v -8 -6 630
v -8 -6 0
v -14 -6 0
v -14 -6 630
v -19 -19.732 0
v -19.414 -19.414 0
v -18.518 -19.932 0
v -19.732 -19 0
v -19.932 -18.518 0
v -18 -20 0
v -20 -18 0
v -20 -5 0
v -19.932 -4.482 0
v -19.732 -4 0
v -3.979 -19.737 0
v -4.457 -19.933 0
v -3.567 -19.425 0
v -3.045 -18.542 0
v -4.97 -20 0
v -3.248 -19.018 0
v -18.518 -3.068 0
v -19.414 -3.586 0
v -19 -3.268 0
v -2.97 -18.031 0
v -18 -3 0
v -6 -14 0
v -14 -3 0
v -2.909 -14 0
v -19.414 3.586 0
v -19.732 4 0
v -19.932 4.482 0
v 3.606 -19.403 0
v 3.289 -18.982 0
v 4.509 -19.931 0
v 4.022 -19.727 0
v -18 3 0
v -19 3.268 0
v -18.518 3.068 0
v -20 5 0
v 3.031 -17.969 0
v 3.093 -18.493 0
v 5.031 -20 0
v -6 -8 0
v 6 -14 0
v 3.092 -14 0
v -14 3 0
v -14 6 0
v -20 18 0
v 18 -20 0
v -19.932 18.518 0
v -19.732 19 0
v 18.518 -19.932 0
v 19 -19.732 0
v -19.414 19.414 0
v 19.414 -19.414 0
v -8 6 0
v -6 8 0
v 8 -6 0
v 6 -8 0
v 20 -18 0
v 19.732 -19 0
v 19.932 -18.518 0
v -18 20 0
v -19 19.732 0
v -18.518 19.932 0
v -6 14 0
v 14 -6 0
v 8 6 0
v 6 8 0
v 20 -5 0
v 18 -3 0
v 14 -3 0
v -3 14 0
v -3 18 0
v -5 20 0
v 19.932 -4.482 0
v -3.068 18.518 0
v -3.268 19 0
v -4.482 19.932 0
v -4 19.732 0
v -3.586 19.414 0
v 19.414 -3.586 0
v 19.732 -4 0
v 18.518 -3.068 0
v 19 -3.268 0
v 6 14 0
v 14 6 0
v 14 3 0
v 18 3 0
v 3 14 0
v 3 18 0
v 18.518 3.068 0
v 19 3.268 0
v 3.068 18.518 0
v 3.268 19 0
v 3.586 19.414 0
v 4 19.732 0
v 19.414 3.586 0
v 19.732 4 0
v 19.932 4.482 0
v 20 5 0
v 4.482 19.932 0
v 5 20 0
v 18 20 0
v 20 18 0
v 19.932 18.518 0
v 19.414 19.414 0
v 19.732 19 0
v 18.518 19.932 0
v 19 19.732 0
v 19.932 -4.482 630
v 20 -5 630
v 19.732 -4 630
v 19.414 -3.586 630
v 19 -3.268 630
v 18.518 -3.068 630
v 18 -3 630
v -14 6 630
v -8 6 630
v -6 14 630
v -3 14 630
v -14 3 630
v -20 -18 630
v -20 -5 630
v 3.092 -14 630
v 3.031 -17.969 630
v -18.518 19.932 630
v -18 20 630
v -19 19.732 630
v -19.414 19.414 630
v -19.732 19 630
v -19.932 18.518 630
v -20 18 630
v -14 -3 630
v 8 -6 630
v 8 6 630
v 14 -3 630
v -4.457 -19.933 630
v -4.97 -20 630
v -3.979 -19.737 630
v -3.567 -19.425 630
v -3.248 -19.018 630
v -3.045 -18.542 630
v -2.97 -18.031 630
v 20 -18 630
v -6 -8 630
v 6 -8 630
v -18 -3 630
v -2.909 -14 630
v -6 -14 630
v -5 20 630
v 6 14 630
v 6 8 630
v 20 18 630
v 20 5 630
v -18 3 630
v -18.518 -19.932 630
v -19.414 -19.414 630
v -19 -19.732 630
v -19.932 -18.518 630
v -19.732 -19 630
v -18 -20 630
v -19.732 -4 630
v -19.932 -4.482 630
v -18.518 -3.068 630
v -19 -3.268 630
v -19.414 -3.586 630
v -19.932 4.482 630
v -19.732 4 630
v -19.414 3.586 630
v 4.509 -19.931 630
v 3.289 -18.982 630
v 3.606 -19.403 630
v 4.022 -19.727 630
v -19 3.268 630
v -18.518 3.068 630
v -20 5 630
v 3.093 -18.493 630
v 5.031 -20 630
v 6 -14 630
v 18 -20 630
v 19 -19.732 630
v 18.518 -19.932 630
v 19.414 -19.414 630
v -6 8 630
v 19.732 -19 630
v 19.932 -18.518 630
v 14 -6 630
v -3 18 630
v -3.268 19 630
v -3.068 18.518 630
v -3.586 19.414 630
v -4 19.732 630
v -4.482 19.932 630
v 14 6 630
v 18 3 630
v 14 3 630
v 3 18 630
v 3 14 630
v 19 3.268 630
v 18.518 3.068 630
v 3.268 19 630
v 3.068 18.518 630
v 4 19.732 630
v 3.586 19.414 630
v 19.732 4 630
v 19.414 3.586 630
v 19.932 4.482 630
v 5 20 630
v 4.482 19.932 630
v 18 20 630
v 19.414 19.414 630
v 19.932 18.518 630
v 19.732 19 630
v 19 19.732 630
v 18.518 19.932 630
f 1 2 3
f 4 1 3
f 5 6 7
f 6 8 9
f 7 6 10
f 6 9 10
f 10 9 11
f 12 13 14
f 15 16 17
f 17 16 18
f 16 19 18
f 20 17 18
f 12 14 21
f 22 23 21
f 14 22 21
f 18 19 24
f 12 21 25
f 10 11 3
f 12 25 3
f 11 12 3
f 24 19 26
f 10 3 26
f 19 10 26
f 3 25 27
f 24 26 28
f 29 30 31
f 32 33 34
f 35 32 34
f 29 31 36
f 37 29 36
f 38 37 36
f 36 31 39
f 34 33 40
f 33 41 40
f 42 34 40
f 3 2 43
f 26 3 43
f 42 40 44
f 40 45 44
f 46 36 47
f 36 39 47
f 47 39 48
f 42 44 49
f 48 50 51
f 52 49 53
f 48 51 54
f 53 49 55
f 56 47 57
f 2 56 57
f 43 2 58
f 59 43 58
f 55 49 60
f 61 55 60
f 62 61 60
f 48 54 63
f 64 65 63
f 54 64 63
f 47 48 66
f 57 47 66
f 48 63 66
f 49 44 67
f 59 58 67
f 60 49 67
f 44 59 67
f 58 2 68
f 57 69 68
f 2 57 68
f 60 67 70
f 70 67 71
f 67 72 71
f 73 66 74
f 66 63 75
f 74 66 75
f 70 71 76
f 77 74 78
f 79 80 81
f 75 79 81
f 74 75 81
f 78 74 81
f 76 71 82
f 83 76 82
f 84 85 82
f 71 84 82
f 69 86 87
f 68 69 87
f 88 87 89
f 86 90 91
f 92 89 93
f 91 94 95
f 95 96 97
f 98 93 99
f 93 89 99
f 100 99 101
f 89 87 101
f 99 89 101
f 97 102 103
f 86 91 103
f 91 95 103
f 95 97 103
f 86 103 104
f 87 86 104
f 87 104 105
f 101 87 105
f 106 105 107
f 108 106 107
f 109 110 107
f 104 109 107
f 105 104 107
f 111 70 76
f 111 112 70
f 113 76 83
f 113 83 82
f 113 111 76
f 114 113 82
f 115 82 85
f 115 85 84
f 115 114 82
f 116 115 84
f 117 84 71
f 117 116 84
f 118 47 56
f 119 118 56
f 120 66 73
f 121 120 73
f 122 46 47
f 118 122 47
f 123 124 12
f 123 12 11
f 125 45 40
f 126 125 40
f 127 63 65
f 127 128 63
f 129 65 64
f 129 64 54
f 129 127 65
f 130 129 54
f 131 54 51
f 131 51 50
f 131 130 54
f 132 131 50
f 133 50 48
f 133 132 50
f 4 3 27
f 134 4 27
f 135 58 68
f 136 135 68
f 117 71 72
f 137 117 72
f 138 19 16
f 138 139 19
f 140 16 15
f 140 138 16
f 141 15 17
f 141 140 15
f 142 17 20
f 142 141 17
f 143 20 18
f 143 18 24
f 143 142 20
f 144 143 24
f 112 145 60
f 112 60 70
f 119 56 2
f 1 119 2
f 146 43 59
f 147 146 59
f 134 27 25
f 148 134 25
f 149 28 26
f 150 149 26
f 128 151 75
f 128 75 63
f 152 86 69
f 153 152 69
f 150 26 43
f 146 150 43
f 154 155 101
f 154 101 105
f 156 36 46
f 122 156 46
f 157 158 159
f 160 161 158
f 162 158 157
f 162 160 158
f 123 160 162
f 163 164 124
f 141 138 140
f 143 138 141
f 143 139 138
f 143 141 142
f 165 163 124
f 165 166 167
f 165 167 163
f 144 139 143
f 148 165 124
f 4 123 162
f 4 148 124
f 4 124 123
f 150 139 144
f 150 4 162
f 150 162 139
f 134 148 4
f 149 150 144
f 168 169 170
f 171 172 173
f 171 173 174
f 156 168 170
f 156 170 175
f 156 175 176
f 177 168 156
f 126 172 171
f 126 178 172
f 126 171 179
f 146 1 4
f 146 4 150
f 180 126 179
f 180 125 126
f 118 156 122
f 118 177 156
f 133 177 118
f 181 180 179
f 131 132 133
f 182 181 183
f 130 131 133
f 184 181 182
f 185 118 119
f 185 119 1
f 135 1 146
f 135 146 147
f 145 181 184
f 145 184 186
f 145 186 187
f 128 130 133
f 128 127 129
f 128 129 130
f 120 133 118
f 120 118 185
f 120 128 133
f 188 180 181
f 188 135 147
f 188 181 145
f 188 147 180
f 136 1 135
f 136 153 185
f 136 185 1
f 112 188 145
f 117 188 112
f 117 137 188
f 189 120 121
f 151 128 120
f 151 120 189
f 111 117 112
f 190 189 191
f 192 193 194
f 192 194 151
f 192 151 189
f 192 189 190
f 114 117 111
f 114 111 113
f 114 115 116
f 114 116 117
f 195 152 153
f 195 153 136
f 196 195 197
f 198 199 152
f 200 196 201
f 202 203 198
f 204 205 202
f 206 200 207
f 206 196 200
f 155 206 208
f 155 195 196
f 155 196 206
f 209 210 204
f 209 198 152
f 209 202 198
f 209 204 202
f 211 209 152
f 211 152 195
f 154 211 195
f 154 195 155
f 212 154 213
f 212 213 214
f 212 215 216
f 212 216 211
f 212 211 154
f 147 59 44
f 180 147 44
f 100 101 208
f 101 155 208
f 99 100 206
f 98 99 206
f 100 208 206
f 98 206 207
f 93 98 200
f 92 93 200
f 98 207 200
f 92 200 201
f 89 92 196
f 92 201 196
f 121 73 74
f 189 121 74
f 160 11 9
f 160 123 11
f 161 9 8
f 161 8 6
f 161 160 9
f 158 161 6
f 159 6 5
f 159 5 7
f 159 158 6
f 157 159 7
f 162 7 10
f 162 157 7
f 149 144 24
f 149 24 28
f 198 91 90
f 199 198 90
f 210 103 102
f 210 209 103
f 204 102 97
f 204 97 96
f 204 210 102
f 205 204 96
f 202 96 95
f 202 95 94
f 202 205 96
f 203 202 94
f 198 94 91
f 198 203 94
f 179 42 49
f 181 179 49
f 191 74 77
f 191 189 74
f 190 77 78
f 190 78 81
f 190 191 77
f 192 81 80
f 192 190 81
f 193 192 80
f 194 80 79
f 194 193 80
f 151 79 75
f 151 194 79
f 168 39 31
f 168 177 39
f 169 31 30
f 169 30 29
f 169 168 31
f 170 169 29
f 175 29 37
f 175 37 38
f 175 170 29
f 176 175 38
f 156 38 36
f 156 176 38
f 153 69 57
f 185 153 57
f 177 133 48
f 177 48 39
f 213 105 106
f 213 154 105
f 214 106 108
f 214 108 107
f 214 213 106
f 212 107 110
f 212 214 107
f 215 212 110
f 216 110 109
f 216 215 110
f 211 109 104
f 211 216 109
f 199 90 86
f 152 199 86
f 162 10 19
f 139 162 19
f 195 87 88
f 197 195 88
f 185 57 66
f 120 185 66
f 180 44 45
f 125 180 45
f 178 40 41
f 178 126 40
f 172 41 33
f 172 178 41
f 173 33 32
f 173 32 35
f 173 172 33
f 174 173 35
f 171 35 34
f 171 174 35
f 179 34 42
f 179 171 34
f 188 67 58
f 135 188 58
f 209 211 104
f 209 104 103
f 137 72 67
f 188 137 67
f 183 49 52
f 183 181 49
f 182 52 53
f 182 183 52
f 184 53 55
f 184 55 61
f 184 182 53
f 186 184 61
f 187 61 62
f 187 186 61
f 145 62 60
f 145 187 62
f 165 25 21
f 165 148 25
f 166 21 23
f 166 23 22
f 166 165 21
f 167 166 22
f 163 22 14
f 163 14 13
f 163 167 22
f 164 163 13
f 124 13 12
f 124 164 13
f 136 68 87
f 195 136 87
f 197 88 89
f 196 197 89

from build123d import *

# Parameters (mm, degrees)
F1_DEPTH = 630
F2_R     = 2


with BuildPart() as f1:
    # F0 (on Top) → F1 (new body)
    with BuildSketch(Plane.XY):
        Polygon((20, 3), (20, 20), (3, 20), (3, 14), (6, 14), (6, 8), (-6, 8), (-6, 14), (-3, 14), (-3, 20), (-20, 20), (-20, 3), (-14, 3), (-14, 6), (-8, 6), (-8, -6), (-14, -6), (-14, -3), (-20, -3), (-20, -20), (-3.00035, -20), (-2.908665, -14), (-6, -14), (-6, -8), (6, -8), (6, -14), (3.092036, -14), (3.00035, -20), (20, -20), (20, -3), (14, -3), (14, -6), (8, -6), (8, 6), (14, 6), (14, 3), align=None)
    extrude(amount=F1_DEPTH)

    # F2
    f2_edges = [f1.edges().sort_by_distance(p)[0] for p in [
        (20, 3, 315),
        (20, 20, 315),
        (20, -20, 315),
        (20, -3, 315),
        (-3.00035, -20, 315),
        (-3, 20, 315),
        (3, 20, 315),
        (-20, 20, 315),
        (-20, -3, 315),
        (-20, 3, 315),
        (-20, -20, 315),
        (3.00035, -20, 315),
    ]]
    fillet(f2_edges, radius=F2_R)


solid = f1.part
